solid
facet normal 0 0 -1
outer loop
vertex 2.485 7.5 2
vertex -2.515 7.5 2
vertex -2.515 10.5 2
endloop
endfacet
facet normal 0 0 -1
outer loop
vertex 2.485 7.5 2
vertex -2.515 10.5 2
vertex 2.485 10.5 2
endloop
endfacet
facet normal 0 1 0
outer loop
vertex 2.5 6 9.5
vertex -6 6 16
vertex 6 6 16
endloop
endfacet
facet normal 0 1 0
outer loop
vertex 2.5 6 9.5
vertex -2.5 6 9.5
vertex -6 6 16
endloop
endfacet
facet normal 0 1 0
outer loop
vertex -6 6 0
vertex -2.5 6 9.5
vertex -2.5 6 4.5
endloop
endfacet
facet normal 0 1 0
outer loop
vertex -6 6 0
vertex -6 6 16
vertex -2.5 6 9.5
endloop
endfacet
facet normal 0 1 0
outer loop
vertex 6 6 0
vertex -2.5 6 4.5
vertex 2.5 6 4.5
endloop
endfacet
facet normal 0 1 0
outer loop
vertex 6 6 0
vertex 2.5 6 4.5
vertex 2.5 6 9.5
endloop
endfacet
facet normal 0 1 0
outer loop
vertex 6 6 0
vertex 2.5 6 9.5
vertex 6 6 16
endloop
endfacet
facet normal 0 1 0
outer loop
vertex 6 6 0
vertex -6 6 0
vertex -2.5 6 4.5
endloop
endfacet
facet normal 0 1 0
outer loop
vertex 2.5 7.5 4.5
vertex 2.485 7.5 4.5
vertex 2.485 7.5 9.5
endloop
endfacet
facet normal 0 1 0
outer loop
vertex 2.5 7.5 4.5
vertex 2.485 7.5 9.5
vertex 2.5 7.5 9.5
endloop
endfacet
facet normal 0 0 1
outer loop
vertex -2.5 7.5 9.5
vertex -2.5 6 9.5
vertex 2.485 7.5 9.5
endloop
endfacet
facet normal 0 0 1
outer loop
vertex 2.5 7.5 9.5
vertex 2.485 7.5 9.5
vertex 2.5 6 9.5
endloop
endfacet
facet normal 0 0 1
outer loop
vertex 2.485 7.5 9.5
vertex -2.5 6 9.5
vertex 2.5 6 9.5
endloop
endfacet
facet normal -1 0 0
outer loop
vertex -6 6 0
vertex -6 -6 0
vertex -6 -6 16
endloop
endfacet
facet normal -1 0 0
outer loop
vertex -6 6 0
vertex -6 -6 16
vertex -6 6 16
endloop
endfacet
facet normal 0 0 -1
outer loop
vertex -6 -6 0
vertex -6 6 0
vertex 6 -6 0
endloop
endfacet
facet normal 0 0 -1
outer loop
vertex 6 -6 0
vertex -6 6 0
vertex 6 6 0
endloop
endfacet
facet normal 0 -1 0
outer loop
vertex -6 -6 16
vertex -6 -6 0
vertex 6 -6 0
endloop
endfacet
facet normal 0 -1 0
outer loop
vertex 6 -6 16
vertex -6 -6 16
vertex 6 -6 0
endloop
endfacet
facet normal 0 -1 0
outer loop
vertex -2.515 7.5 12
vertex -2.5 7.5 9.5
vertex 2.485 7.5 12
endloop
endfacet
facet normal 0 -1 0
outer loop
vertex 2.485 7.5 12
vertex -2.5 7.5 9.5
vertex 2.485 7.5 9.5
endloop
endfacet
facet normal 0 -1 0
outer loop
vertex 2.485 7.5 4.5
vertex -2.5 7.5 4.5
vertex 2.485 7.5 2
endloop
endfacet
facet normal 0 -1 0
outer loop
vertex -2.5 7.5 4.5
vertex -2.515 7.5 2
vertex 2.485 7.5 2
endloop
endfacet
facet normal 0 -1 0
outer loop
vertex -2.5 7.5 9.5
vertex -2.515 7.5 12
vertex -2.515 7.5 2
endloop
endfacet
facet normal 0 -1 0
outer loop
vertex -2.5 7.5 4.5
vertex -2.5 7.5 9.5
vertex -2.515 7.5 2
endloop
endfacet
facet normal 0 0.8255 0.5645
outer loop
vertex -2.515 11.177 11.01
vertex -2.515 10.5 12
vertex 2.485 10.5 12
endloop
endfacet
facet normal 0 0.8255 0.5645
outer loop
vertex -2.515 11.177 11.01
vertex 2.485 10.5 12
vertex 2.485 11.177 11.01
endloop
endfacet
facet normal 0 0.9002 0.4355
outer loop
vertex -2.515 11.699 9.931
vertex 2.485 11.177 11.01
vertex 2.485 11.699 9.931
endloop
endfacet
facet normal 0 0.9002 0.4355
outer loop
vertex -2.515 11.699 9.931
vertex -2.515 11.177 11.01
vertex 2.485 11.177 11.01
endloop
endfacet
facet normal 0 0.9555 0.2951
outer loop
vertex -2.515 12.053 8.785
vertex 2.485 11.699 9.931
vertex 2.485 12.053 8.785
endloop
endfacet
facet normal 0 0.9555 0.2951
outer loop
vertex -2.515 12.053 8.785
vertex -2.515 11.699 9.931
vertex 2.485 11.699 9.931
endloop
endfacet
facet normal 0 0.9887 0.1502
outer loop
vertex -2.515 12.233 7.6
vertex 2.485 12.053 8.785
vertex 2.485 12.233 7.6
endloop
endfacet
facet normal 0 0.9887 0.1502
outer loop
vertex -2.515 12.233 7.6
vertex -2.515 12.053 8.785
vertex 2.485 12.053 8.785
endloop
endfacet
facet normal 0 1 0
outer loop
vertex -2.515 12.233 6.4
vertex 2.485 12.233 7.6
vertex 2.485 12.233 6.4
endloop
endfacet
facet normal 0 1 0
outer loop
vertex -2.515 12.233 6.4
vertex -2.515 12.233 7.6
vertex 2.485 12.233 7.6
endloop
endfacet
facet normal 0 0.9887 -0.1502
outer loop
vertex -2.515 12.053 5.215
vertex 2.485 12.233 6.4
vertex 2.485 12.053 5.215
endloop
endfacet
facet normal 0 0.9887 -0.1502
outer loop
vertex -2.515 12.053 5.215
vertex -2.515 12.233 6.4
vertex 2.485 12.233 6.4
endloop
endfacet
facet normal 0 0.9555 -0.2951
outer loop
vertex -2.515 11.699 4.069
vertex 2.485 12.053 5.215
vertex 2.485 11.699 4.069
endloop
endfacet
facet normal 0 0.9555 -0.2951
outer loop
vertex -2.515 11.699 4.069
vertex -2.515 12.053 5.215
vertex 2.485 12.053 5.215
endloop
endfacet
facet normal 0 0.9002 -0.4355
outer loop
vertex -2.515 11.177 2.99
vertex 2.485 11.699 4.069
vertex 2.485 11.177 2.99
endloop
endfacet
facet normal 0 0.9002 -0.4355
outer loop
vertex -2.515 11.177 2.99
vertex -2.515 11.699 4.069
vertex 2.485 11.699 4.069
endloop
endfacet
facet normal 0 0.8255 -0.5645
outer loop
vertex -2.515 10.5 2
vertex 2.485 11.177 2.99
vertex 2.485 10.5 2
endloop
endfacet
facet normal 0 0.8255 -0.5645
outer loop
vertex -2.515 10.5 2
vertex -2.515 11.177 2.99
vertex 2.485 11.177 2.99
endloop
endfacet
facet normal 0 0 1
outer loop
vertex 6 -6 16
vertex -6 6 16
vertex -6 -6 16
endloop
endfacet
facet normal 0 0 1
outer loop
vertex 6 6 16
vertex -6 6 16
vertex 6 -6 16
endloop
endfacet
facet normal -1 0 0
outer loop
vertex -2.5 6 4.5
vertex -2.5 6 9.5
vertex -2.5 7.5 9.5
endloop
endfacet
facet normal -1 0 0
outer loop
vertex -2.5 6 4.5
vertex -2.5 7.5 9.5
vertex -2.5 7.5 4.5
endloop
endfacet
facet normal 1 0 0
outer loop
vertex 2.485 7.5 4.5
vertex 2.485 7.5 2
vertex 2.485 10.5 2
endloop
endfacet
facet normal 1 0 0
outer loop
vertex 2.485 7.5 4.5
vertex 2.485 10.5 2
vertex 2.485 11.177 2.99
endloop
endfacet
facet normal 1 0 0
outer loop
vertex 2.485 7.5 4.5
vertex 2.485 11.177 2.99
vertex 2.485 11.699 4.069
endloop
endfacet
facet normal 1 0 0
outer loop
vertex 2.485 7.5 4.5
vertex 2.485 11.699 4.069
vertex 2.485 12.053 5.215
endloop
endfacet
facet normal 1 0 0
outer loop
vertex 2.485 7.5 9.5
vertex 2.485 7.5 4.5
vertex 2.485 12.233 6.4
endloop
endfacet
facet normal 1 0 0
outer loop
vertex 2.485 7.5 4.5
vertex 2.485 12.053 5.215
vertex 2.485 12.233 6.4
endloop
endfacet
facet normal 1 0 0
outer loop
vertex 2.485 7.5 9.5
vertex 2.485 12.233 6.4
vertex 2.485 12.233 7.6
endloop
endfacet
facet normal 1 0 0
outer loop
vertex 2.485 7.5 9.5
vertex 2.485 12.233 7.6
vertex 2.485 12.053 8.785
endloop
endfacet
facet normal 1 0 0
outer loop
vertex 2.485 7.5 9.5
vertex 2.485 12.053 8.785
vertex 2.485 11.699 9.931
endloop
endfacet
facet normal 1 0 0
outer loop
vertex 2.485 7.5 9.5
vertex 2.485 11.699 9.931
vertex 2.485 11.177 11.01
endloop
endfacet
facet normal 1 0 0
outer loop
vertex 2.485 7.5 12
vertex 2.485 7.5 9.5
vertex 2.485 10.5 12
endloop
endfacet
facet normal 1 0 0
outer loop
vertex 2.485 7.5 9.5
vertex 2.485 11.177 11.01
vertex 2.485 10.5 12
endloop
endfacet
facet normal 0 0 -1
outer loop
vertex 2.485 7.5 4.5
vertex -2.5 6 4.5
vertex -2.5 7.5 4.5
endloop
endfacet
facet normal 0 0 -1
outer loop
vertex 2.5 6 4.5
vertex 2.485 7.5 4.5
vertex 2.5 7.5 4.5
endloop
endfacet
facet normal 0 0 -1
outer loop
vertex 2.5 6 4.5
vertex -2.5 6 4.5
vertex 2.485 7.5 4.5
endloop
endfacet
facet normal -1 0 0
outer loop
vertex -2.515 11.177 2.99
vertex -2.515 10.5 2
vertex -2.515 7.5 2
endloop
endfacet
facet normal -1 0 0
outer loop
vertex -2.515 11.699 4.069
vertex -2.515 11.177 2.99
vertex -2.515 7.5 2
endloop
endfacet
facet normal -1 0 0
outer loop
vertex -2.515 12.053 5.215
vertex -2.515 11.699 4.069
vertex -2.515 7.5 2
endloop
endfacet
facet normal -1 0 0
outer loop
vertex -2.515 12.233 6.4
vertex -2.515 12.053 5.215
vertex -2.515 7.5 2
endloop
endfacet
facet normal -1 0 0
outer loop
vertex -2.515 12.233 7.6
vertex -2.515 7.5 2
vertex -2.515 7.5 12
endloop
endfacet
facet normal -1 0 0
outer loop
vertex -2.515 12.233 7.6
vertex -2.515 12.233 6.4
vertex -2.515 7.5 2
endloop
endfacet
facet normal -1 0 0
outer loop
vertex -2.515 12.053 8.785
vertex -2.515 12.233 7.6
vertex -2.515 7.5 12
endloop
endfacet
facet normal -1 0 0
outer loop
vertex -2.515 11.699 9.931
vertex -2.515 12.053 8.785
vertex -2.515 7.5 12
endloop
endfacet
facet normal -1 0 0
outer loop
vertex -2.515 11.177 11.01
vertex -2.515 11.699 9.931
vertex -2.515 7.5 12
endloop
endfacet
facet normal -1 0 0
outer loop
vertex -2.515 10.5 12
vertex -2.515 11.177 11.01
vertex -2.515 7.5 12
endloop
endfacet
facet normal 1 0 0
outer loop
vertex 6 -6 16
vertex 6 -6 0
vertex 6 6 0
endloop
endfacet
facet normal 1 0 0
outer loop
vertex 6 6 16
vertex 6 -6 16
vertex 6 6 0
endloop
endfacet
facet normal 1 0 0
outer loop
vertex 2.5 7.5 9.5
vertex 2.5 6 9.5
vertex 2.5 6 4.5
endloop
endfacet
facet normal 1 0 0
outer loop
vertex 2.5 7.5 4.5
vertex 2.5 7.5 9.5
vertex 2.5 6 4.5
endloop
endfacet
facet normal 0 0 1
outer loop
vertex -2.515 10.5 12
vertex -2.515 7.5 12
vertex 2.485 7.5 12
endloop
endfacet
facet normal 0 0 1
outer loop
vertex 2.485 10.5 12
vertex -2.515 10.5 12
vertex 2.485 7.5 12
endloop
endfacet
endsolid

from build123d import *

# Parameters (mm, degrees)
SKETCH_1_W      = 12
SKETCH_1_H      = 12
EXTRUDE_1_DEPTH = 16
SKETCH_2_W      = 5
SKETCH_2_H      = 5
EXTRUDE_2_DEPTH = 1.5
SKETCH_3_W      = 5
SKETCH_3_H      = 10
EXTRUDE_3_DEPTH = 3
EXTRUDE_4_DEPTH = 5


with BuildPart() as part:
    # 스케치1 → 보스-돌출1 (new body)
    with BuildSketch(Plane.XY):
        Rectangle(SKETCH_1_W, SKETCH_1_H)
    extrude(amount=EXTRUDE_1_DEPTH)

    # 스케치2 → 보스-돌출2 (add)
    with BuildSketch(Plane(origin=(0, 6, 0), x_dir=(1, 0, 0), z_dir=(0, 1, 0))):
        with Locations((0, -7)):
            Rectangle(SKETCH_2_W, SKETCH_2_H)
    extrude(amount=EXTRUDE_2_DEPTH)

    # 스케치3 → 보스-돌출3 (add)
    with BuildSketch(Plane(origin=(0, 7.5, 0), x_dir=(1, 0, 0), z_dir=(0, 1, 0))):
        with Locations((-0.014967469, -7)):
            Rectangle(SKETCH_3_W, SKETCH_3_H)
    extrude(amount=EXTRUDE_3_DEPTH)

    # 스케치4 → 보스-돌출4 (add)
    with BuildSketch(Plane.ZY.offset(2.514967469)):
        with BuildLine():
            Line((2, 10.5), (12, 10.5))
            ThreePointArc((12, 10.5), (7, 12.255002002), (2, 10.5))
        make_face()
    extrude(amount=-EXTRUDE_4_DEPTH)


solid = part.part
